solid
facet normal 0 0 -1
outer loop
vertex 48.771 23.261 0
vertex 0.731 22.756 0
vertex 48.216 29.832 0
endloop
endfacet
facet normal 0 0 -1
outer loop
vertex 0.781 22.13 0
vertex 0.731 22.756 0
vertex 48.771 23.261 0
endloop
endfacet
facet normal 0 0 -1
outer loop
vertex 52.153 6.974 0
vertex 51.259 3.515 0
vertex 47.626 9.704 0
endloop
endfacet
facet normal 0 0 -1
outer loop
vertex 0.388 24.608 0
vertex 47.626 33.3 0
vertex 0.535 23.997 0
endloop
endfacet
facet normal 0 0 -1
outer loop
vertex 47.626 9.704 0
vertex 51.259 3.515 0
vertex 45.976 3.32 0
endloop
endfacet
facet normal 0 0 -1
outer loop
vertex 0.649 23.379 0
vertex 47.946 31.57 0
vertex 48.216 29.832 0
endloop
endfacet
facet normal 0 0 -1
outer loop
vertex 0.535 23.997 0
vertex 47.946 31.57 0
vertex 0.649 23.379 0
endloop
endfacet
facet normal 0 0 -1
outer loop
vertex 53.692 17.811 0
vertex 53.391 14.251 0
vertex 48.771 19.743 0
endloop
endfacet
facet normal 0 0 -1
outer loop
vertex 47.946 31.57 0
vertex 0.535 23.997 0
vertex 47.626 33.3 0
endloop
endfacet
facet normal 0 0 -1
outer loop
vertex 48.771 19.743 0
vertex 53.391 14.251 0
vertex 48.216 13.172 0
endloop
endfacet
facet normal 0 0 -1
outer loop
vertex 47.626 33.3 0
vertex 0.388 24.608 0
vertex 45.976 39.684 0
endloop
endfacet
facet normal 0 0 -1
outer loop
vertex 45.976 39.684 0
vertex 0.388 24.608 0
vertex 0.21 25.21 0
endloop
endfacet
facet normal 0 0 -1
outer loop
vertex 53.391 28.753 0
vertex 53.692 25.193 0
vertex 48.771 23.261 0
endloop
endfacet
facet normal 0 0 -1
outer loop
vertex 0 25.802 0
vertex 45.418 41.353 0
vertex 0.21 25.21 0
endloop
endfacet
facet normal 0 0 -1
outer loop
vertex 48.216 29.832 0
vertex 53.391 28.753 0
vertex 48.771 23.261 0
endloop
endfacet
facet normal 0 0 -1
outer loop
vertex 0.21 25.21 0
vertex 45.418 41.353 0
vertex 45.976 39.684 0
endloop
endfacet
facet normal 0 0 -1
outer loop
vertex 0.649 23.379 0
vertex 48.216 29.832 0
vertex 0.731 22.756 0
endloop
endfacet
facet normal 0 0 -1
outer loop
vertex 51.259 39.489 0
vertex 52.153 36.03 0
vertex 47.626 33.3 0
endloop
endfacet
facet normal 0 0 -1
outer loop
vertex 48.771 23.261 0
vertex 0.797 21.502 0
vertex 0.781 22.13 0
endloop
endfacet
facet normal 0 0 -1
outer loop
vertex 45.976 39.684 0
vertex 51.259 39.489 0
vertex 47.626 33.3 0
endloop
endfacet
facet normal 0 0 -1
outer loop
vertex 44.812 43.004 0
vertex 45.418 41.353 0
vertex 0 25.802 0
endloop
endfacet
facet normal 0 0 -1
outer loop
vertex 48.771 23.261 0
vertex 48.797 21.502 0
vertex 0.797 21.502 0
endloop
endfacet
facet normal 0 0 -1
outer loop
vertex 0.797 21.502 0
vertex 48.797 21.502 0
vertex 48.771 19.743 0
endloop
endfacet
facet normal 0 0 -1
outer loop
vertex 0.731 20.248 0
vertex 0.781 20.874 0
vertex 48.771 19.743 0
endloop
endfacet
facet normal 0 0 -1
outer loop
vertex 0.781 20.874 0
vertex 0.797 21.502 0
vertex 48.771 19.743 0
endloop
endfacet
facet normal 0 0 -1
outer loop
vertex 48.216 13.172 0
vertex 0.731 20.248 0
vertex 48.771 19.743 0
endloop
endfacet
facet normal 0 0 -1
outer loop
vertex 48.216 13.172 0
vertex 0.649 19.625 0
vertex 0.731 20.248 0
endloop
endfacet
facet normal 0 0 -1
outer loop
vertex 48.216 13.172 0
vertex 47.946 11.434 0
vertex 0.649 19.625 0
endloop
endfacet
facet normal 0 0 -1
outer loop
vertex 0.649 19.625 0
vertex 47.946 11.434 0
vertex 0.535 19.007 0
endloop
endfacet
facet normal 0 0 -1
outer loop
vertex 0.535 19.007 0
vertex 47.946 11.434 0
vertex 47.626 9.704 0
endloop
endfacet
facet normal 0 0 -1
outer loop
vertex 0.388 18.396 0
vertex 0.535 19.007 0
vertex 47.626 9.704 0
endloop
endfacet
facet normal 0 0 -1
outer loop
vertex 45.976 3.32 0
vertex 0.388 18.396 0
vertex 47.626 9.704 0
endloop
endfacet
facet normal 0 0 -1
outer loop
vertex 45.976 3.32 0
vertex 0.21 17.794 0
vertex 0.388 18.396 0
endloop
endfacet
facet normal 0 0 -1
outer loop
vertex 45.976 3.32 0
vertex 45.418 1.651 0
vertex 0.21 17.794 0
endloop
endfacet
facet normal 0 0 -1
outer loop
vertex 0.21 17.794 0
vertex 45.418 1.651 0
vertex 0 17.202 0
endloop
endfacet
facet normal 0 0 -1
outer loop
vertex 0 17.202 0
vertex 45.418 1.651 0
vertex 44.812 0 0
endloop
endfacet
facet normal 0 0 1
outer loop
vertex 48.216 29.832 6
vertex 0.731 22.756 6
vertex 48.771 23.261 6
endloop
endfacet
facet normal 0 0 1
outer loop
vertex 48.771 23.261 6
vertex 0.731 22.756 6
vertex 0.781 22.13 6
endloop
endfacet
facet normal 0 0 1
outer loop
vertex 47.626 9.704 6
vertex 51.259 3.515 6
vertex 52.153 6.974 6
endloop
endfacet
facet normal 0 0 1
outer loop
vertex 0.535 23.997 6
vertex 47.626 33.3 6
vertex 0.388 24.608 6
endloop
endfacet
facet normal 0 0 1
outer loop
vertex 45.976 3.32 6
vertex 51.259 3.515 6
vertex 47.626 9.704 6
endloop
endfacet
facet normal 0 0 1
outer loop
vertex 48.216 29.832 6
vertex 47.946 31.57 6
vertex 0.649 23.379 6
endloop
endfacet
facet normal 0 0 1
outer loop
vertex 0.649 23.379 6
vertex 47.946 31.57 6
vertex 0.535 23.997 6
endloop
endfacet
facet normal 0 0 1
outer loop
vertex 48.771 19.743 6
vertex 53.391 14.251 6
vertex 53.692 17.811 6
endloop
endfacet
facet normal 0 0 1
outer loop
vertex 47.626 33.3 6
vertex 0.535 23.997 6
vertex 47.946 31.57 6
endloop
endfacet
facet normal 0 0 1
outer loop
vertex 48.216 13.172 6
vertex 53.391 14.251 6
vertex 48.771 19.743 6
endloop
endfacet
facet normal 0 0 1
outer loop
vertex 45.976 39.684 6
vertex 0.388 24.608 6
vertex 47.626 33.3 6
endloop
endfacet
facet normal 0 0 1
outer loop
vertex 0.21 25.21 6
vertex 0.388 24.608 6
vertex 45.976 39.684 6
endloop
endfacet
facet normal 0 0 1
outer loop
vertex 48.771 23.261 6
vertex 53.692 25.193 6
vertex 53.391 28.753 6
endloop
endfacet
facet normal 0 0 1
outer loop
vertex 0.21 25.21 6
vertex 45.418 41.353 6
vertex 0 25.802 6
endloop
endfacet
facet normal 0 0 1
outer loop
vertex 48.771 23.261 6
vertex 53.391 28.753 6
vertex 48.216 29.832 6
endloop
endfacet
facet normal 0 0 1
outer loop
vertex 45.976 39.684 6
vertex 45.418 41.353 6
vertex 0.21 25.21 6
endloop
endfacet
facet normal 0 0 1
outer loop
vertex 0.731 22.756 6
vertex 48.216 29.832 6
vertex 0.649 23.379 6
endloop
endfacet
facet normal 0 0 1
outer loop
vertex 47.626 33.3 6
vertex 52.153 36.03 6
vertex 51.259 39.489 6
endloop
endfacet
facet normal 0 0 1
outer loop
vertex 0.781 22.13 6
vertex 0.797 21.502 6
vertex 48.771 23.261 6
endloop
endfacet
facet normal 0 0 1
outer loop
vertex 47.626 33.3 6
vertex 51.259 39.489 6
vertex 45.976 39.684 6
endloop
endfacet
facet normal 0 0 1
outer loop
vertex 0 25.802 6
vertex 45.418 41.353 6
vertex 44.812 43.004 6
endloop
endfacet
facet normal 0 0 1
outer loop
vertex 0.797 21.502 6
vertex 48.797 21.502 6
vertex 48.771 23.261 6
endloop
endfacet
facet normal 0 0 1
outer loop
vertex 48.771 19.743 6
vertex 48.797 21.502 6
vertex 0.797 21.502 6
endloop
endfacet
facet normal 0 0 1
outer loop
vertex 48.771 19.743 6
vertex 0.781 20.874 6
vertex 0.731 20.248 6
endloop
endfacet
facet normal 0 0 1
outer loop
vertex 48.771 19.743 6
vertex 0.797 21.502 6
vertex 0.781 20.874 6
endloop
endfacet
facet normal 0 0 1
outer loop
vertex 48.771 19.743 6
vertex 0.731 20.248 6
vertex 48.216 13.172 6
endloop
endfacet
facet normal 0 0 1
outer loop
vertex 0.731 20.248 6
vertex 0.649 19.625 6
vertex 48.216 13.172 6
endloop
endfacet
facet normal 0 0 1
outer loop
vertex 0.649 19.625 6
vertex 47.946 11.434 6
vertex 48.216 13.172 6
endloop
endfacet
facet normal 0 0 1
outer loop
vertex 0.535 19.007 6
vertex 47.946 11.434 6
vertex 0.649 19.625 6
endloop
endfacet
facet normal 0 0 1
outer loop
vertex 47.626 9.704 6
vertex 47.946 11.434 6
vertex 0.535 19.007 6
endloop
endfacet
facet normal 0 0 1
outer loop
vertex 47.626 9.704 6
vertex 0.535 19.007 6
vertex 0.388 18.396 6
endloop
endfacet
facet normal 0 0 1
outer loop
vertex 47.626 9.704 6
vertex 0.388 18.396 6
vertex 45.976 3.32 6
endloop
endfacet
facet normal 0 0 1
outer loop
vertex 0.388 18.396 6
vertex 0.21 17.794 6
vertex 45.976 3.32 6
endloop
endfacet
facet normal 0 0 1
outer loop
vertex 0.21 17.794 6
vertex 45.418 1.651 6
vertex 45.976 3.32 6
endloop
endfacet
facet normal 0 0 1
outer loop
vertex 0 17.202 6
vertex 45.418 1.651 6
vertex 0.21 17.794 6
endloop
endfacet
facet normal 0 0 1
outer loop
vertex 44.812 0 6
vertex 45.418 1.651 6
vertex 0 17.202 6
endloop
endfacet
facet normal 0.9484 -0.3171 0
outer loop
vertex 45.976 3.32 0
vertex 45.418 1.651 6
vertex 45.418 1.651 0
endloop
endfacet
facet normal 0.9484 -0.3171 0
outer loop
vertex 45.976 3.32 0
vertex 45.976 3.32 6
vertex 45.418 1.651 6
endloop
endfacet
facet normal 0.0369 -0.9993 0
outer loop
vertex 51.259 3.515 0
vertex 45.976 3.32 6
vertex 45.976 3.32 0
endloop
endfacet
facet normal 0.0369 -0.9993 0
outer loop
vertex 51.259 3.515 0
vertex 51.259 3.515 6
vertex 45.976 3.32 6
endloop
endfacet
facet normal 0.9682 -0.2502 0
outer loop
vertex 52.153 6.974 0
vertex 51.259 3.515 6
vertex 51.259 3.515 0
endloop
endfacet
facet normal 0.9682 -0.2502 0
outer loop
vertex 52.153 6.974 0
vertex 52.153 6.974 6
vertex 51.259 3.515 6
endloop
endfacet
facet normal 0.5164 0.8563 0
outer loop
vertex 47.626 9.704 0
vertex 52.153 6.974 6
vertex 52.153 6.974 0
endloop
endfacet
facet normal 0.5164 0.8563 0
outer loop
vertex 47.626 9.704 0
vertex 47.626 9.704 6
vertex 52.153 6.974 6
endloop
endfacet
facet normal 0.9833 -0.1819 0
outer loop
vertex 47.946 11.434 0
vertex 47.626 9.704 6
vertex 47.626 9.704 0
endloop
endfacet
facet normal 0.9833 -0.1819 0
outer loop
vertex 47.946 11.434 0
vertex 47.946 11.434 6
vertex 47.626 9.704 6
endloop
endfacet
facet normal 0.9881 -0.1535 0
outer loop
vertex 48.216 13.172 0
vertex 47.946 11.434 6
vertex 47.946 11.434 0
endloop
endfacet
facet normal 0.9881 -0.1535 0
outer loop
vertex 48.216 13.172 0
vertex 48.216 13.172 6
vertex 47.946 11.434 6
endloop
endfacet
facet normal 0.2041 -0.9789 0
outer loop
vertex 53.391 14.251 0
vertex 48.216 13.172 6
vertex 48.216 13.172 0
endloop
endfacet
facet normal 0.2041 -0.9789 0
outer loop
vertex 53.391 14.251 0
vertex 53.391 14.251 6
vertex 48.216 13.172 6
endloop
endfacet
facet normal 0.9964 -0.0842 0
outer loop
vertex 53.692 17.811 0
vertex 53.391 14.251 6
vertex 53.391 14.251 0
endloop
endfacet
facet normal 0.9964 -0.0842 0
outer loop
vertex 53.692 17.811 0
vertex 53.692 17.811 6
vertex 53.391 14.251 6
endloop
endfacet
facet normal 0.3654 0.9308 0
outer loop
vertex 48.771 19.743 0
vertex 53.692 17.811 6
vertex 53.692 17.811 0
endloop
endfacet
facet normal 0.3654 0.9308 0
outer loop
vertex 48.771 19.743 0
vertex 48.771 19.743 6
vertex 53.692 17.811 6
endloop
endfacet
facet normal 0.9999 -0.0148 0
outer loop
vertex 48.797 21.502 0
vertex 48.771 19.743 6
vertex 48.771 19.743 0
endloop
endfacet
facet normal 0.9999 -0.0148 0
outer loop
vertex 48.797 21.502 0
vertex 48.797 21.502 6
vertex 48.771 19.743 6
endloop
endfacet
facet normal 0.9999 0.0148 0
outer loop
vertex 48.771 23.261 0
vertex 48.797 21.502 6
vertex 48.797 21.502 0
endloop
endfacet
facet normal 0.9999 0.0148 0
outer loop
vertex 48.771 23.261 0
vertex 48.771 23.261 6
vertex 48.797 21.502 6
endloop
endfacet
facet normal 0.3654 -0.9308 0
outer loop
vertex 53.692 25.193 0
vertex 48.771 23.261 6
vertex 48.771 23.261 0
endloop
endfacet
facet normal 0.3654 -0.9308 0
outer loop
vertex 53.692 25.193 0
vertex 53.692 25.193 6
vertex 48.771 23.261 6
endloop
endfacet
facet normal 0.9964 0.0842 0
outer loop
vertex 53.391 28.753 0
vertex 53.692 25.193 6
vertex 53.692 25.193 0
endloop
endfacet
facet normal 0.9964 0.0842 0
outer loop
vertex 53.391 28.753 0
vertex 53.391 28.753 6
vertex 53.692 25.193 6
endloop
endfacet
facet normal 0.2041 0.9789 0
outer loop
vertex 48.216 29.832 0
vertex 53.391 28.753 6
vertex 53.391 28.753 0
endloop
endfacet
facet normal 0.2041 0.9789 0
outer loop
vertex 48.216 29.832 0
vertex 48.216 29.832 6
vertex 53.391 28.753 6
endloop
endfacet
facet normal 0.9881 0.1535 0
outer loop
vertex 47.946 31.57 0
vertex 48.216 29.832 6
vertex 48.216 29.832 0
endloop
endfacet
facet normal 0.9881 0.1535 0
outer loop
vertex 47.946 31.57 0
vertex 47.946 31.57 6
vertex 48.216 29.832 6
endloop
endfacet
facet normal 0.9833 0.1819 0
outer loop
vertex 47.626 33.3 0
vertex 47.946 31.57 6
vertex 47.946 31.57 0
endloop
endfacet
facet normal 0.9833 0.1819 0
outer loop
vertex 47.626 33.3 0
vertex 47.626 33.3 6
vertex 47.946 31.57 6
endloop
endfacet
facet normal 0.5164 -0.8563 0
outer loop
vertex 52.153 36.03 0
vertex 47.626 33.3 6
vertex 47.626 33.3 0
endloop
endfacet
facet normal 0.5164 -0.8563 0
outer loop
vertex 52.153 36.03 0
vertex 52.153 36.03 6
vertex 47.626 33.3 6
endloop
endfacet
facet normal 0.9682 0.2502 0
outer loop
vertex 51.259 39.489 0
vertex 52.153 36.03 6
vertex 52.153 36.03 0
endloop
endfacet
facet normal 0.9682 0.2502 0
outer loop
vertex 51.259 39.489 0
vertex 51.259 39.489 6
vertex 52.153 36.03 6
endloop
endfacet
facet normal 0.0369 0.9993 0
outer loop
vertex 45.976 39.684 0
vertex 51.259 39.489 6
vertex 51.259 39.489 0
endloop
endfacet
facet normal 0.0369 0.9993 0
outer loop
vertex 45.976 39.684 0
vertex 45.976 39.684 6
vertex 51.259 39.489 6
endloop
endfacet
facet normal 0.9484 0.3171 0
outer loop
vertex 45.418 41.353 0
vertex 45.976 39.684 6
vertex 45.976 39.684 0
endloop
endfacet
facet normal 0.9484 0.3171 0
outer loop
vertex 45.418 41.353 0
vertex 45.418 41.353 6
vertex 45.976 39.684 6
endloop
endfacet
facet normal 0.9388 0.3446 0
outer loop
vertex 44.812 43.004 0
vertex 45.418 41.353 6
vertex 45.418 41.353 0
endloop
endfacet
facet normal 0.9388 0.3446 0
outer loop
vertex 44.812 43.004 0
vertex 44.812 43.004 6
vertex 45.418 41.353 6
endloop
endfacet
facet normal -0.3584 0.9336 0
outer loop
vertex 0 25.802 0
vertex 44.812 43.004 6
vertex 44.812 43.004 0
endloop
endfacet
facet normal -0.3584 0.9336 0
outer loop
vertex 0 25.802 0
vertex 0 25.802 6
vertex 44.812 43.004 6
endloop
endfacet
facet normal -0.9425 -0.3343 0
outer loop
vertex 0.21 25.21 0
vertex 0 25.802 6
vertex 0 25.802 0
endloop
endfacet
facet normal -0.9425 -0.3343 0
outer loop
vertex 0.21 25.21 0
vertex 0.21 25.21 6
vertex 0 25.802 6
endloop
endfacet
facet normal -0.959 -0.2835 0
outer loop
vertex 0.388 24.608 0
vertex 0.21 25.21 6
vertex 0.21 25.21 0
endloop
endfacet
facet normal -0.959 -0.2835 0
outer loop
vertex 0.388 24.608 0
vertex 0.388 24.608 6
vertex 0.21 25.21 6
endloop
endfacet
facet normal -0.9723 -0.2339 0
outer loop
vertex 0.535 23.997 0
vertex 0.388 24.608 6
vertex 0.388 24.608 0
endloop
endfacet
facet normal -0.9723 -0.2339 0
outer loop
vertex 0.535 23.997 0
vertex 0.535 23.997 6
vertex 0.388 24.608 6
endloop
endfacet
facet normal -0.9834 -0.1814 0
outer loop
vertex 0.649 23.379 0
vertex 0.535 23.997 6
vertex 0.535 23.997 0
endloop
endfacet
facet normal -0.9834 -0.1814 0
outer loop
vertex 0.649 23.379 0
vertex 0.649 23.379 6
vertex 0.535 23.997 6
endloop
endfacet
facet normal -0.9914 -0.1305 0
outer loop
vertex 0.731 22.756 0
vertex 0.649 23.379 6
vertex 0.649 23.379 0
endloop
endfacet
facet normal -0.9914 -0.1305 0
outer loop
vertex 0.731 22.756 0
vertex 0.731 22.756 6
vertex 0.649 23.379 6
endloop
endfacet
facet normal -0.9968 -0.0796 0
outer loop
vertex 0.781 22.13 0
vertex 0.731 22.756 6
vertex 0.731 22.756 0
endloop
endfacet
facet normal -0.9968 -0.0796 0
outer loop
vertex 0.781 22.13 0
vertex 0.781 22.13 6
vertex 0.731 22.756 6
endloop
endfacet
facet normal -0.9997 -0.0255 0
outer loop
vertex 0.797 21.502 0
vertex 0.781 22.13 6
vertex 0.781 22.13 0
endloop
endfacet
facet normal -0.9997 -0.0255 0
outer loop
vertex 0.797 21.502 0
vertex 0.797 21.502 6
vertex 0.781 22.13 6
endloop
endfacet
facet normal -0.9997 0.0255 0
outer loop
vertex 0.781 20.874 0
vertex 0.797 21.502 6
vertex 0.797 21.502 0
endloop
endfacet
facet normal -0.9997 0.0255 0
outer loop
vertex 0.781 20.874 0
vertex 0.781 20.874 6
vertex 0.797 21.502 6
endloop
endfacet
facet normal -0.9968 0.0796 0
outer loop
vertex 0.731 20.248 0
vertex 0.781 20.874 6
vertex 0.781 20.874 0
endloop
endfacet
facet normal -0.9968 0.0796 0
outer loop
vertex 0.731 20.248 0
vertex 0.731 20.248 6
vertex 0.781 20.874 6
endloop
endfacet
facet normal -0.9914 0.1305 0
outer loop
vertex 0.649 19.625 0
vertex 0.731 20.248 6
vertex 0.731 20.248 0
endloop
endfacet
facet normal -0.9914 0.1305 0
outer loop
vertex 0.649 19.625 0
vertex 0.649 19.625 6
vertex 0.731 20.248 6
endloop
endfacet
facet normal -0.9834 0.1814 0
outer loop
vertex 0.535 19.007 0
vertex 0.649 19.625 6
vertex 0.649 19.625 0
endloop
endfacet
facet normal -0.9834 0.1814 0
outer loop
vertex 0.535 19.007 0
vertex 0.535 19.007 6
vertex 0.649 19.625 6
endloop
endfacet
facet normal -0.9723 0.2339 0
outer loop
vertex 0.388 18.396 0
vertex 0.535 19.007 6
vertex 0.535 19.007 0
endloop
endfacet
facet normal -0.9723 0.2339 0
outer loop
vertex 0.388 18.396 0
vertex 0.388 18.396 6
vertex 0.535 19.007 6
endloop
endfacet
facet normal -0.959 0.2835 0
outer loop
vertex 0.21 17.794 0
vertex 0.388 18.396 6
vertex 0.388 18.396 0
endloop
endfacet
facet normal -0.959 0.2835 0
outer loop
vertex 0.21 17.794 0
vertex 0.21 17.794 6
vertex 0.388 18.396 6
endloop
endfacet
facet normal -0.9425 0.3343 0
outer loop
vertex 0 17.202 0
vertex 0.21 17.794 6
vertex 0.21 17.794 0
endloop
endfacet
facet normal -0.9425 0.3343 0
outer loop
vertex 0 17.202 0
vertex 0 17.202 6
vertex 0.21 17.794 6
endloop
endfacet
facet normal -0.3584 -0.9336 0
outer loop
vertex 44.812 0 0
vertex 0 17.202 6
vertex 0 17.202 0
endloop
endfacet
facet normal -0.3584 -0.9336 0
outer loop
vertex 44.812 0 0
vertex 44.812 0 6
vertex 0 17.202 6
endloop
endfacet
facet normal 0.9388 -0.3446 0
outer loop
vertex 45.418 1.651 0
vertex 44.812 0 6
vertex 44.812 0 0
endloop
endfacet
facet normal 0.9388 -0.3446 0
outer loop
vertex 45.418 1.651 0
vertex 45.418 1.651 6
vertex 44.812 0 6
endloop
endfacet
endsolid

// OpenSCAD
$fn = 32;

// ----------------------------------------------------------------------
// Gear sector: 4 teeth on 42 degrees
// ----------------------------------------------------------------------

// --- parameters (mm) ---
sector_angle = 42;        // sector angle, degrees
root_r = 60;              // root circle radius
tooth_h = 5;              // tooth height over the root circle
teeth = 4;                // number of teeth on the sector
hub_r = 12;               // hub bore radius
plate_t = 6;              // sector thickness, Z
arc_step = 3;             // sampling step of the root/hub arcs, degrees

tip_r = root_r + tooth_h;  // tip circle radius

profile = [[44.812, 0], [45.418, 1.651], [45.976, 3.32], [51.259, 3.515], [52.153, 6.974], [47.626, 9.704], [47.946, 11.434], [48.216, 13.172], [53.391, 14.251], [53.692, 17.811], [48.771, 19.743], [48.797, 21.502], [48.771, 23.261], [53.692, 25.193], [53.391, 28.753], [48.216, 29.832], [47.946, 31.57], [47.626, 33.3], [52.153, 36.03], [51.259, 39.489], [45.976, 39.684], [45.418, 41.353], [44.812, 43.004], [0, 25.802], [0.21, 25.21], [0.388, 24.608], [0.535, 23.997], [0.649, 23.379], [0.731, 22.756], [0.781, 22.13], [0.797, 21.502], [0.781, 20.874], [0.731, 20.248], [0.649, 19.625], [0.535, 19.007], [0.388, 18.396], [0.21, 17.794], [0, 17.202]];  // primary outline, 38 points, counter clockwise

// --- the one profile operation ---
linear_extrude(height = plate_t) polygon(points = profile);
